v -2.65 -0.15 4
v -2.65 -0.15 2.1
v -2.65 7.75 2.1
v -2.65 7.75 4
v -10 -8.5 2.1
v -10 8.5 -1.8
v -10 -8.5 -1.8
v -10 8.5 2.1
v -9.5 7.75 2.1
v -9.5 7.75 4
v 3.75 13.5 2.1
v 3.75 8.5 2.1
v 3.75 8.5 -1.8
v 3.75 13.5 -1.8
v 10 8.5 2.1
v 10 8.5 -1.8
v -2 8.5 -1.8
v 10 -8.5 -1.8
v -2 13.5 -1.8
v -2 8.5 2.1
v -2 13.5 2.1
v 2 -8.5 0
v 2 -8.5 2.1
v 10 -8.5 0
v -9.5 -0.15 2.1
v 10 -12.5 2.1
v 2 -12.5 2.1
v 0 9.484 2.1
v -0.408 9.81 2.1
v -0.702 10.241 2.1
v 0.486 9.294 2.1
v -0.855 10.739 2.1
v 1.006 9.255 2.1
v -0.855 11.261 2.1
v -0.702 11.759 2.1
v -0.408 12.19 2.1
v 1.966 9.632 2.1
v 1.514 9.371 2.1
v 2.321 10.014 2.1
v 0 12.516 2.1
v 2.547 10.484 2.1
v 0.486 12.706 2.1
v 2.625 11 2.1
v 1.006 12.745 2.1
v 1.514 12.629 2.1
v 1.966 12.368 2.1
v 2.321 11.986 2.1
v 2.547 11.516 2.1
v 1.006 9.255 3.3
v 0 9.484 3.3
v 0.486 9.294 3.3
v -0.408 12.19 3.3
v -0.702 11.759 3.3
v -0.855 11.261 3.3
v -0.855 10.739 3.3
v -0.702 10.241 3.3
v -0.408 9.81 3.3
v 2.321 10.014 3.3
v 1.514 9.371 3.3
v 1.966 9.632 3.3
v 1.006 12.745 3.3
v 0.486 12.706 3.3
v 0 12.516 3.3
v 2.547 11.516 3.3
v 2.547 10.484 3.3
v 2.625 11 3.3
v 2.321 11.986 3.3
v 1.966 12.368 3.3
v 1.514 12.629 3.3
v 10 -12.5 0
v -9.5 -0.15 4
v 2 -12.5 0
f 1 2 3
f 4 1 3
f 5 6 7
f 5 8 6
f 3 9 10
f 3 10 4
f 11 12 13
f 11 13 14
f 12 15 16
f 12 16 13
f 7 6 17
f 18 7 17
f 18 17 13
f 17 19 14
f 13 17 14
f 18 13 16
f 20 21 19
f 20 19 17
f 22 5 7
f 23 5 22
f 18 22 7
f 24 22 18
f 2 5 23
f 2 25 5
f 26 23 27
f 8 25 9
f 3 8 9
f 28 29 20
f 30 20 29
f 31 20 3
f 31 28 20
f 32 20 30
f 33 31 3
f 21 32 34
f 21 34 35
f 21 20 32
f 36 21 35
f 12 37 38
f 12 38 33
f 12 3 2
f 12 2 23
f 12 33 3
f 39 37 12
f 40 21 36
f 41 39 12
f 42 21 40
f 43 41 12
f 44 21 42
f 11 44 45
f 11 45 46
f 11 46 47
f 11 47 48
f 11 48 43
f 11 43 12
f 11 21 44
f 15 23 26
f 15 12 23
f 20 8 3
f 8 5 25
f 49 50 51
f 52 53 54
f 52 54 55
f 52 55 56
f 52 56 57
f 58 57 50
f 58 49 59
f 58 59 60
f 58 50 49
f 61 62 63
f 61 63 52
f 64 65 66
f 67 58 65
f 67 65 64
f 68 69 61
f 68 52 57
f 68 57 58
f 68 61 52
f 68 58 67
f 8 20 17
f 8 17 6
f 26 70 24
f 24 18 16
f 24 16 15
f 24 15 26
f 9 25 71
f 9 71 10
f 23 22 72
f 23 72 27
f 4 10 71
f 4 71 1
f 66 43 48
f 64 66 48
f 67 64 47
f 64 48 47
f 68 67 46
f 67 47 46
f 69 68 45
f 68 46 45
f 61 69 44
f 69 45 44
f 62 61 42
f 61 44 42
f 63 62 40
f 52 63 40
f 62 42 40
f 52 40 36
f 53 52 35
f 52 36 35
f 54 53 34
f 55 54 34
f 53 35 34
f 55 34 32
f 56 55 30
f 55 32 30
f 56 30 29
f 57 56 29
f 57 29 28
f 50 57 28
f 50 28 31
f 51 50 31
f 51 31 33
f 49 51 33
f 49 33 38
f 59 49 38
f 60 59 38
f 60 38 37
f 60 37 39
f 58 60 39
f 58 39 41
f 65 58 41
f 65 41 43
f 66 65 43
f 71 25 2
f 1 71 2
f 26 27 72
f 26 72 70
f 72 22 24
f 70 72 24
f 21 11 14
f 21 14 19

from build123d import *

# Parameters (mm, degrees)
F1_DEPTH      = 2.1
F1_DEPTH_BACK = 1.8
F2_R          = 1.75
F3_DEPTH      = 3.3
F4_W          = 6.85
F4_H          = 7.9
F5_DEPTH      = 4
F6_W          = 8
F6_H          = 2.1
F7_DEPTH      = 4


with BuildPart() as f1:
    # F0 (on Top) → F1 (new body, two sides)
    with BuildSketch(Plane.XY) as f1_sk:
        Polygon((10, -8.5), (10, 8.5), (3.75, 8.5), (3.75, 13.5), (-2, 13.5), (-2, 8.5), (-10, 8.5), (-10, -8.5), align=None)
    extrude(amount=F1_DEPTH)
    extrude(f1_sk.sketch, amount=-F1_DEPTH_BACK)

    # F2 (on Top) → F3 (join)
    with BuildSketch(Plane.XY):
        with Locations((0.875, 11)):
            Circle(F2_R)
    extrude(amount=F3_DEPTH)

    # F4 (on Top) → F5 (join)
    with BuildSketch(Plane.XY):
        with Locations((-6.075, 3.8)):
            Rectangle(F4_W, F4_H)
    extrude(amount=F5_DEPTH)

    # F6 (on face) → F7 (join)
    with BuildSketch(Plane.XZ.offset(8.5)):
        with Locations((6, 1.05)):
            Rectangle(F6_W, F6_H)
    extrude(amount=F7_DEPTH)


solid = f1.part
